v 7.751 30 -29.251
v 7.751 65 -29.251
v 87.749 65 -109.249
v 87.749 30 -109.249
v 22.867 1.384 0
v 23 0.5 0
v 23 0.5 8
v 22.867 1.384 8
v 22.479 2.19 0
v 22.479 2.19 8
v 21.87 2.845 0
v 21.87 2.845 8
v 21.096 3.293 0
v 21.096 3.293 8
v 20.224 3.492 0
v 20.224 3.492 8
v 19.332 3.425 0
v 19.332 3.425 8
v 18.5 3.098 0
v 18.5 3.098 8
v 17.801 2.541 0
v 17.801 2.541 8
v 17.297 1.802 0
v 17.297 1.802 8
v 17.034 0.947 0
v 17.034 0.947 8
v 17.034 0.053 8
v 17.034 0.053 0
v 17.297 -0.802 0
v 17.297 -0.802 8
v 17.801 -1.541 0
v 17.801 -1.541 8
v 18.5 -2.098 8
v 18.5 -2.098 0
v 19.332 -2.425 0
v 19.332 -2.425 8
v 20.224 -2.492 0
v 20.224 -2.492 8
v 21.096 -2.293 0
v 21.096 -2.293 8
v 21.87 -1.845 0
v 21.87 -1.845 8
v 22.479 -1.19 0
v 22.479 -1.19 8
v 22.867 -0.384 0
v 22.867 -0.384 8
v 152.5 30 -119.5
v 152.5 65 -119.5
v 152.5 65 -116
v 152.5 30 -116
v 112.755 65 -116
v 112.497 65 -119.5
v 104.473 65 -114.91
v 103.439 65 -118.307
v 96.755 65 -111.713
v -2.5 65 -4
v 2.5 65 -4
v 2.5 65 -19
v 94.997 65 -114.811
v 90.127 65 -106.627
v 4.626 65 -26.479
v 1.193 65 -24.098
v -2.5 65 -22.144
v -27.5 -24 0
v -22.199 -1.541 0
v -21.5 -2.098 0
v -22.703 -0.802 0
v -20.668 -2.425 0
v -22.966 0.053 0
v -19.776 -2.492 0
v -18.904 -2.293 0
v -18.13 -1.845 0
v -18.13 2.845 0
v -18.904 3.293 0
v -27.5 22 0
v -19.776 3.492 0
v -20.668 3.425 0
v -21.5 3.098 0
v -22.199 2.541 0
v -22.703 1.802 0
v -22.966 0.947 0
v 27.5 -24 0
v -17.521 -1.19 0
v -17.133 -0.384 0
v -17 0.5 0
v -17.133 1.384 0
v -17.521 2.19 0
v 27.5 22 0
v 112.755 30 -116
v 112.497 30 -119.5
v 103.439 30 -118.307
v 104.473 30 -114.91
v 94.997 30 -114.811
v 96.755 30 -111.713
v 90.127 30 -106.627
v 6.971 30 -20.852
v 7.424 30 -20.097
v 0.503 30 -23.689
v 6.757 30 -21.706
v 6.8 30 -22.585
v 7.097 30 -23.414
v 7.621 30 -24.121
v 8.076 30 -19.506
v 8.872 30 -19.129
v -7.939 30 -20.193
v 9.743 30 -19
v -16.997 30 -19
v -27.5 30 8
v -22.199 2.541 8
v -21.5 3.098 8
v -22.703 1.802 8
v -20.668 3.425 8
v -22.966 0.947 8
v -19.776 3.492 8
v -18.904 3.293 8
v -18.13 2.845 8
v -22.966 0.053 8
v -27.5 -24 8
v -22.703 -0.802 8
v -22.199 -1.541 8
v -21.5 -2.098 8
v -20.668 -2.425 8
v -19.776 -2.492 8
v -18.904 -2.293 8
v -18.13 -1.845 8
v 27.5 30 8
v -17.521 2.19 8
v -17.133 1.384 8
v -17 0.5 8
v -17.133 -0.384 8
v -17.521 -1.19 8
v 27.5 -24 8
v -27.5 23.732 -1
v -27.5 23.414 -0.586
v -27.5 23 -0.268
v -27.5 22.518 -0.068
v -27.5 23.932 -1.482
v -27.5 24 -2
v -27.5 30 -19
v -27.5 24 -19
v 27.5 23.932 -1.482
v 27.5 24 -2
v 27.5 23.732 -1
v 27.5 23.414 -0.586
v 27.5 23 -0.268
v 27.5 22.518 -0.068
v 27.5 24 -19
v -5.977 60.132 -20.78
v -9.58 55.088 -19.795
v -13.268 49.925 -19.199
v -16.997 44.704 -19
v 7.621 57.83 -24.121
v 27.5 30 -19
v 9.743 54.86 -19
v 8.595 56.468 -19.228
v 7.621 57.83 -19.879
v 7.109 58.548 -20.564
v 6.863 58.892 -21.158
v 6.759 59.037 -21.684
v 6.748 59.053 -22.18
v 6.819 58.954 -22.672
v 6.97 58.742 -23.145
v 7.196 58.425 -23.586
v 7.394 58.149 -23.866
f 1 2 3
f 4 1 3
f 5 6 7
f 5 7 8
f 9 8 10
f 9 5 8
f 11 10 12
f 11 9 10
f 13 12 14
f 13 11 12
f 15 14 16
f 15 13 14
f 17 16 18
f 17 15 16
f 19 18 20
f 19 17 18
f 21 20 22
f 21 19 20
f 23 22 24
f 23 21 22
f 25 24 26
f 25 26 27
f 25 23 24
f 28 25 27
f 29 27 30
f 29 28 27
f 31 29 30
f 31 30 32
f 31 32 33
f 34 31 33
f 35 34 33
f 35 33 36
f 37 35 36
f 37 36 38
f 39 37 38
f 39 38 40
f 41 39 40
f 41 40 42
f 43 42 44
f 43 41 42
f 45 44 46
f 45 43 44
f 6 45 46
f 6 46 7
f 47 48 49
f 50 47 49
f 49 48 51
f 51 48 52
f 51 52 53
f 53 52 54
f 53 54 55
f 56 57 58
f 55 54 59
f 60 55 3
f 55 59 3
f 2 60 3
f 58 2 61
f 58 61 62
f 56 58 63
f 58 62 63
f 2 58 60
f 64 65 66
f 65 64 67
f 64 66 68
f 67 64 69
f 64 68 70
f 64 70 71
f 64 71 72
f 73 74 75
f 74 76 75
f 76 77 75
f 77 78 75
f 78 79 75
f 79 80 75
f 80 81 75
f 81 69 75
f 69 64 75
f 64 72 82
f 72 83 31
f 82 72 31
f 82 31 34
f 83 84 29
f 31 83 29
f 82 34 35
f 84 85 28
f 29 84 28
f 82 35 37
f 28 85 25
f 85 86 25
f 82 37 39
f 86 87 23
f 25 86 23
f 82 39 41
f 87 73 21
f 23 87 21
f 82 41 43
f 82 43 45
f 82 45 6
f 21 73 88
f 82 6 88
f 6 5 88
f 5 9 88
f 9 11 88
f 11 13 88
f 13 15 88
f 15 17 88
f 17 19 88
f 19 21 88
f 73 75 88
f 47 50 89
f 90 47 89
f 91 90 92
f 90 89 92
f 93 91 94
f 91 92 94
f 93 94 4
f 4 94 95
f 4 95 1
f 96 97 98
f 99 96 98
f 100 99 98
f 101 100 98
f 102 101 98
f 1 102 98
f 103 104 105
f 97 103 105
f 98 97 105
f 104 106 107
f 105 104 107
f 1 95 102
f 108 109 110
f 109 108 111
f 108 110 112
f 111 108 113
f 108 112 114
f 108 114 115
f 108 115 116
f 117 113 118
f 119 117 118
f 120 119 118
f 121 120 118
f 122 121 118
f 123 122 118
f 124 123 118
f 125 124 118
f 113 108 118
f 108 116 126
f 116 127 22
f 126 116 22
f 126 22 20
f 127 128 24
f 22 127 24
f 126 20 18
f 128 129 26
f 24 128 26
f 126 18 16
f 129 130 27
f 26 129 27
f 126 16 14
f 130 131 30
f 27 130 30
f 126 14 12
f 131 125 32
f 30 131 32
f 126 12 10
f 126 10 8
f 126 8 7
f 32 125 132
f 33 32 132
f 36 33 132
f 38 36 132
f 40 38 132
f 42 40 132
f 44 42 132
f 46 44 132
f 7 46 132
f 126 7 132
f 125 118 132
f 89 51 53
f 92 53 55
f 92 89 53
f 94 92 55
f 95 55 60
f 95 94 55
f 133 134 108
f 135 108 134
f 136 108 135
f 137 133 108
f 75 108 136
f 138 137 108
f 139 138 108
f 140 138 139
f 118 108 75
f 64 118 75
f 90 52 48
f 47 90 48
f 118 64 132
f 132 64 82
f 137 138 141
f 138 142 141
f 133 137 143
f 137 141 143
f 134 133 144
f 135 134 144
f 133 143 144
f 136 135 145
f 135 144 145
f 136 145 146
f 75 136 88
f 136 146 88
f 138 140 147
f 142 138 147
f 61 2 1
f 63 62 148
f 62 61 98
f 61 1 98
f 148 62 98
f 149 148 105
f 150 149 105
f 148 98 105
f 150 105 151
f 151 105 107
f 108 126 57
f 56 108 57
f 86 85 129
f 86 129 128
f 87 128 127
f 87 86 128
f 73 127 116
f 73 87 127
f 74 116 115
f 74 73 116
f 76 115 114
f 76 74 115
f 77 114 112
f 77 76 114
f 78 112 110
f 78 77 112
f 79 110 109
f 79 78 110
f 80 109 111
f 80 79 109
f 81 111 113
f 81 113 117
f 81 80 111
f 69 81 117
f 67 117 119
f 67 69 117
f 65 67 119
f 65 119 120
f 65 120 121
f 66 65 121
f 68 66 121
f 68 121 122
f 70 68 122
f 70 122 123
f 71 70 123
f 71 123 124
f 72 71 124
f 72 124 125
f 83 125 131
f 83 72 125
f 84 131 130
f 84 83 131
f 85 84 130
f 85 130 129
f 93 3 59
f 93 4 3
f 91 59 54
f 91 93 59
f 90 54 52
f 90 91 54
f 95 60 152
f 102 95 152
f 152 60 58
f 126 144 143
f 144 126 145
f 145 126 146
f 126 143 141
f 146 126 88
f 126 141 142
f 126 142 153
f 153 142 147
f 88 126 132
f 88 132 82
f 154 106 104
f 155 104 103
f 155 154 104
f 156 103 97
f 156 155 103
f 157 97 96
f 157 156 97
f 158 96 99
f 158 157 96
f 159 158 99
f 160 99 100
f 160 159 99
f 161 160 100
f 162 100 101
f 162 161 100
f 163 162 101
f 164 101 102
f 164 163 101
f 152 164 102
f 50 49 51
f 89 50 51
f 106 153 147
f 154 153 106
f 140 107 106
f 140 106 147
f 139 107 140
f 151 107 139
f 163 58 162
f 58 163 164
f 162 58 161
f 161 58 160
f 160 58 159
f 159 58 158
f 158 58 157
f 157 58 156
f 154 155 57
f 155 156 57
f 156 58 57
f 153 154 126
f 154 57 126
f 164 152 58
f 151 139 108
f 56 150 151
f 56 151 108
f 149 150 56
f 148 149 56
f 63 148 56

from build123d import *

# Parameters (mm, degrees)
SKETCH1_W           = 55
SKETCH1_H           = 48
SKETCH1_R           = 3
BOSS_EXTRUDE1_DEPTH = 8
SKETCH2_W           = 55
SKETCH2_H           = 27
BOSS_EXTRUDE2_DEPTH = 6
SKETCH3_W           = 15
SKETCH3_H           = 35
BOSS_EXTRUDE3_DEPTH = 2.5
FILLET1_R           = 2
RIB1_REACH          = 75.091
SKETCH4_WALL_W      = 185.181394164
SKETCH4_WALL_H      = 5
BOSS_EXTRUDE5_REACH = 77.566
BOSS_EXTRUDE6_DEPTH = 35
FILLET3_R           = 35
FILLET4_R           = 32
FILLET5_R           = 35
FILLET6_R           = 3


with BuildPart() as part:
    # Sketch1 → Boss-Extrude1 (new body)
    with BuildSketch(Plane.XY):
        Rectangle(SKETCH1_W, SKETCH1_H)
        with Locations((20, 0.5)):
            Circle(SKETCH1_R, mode=Mode.SUBTRACT)
        with Locations((-20, 0.5)):
            Circle(SKETCH1_R, mode=Mode.SUBTRACT)
    extrude(amount=BOSS_EXTRUDE1_DEPTH)

    # Sketch2 → Boss-Extrude2 (add)
    with BuildSketch(Plane(origin=(0, 24, 0), x_dir=(1, 0, 0), z_dir=(0, 1, 0))):
        with Locations((0, 5.5)):
            Rectangle(SKETCH2_W, SKETCH2_H)
    extrude(amount=BOSS_EXTRUDE2_DEPTH)

    # Sketch3 → Boss-Extrude3 (add, symmetric)
    with BuildSketch(Plane(origin=(0, 0, 0), x_dir=(0, 0, -1), z_dir=(1, 0, 0))):
        with Locations((11.5, 47.5)):
            Rectangle(SKETCH3_W, SKETCH3_H)
    extrude(amount=BOSS_EXTRUDE3_DEPTH, both=True)

    # Fillet1
    fillet1_edges = [part.edges().sort_by_distance(p)[0] for p in [
        (0, 24, 0),
    ]]
    fillet(fillet1_edges, radius=FILLET1_R)

    # Sketch4 wall → Rib1 (add, up to next)
    with BuildSketch(Plane(origin=(0, 47.5, 2), x_dir=(0, -0.945945945946, 0.324324324324), z_dir=(0, -0.324324324324, -0.945945945946)), mode=Mode.PRIVATE) as rib1_sk1:
        Rectangle(SKETCH4_WALL_W, SKETCH4_WALL_H)
    rib1_tool1 = extrude(rib1_sk1.sketch, amount=RIB1_REACH, mode=Mode.PRIVATE) - part.part
    add(rib1_tool1.solids().sort_by_distance((0, 47.5, 2))[0])

    # Boss-Extrude5: up to this plane
    boss_extrude5_end = Plane(origin=(0, 65, -4), z_dir=(0, 0.3243243243243244, 0.945945945945946))
    # Sketch5 → Boss-Extrude5 (add, up to the surface)
    with BuildSketch(Plane(origin=(0, 0, -19), x_dir=(-1, 0, 0), z_dir=(0, 0, -1)), mode=Mode.PRIVATE) as boss_extrude5_sk1:
        Polygon((-27.5, 30), (-2.5, 65), (-2.5, 30), align=None)
    boss_extrude5_tool1 = split(extrude(boss_extrude5_sk1.sketch, amount=-BOSS_EXTRUDE5_REACH, mode=Mode.PRIVATE), bisect_by=boss_extrude5_end, keep=Keep.BOTH, mode=Mode.PRIVATE)
    boss_extrude5 = boss_extrude5_tool1.solids().sort_by_distance((10.833333, 41.666667, -19))[0]
    add(boss_extrude5)

    # Mirror1: Boss-Extrude5 across plane
    add(boss_extrude5.mirror(Plane(origin=(0, 0, 0), x_dir=(0, 0, 1), z_dir=(1, 0, 0))))

    # Sketch7 → Boss-Extrude6 (add)
    with BuildSketch(Plane(origin=(0, 65, 0), x_dir=(1, 0, 0), z_dir=(0, 1, 0))):
        Polygon((2.5, 19), (-2.5, 19), (98, 119.5), (152.5, 119.5), (152.5, 116), (99.5, 116), align=None)
    extrude(amount=-BOSS_EXTRUDE6_DEPTH)

    # Fillet3
    fillet3_edges = [part.edges().sort_by_distance(p)[0] for p in [
        (98, 47.5, -119.5),
    ]]
    fillet(fillet3_edges, radius=FILLET3_R)

    # Fillet4
    fillet4_edges = [part.edges().sort_by_distance(p)[0] for p in [
        (99.5, 47.5, -116),
    ]]
    fillet(fillet4_edges, radius=FILLET4_R)

    # Fillet5
    fillet5_edges = [part.edges().sort_by_distance(p)[0] for p in [
        (-2.5, 47.5, -19),
    ]]
    fillet(fillet5_edges, radius=FILLET5_R)

    # Fillet6
    # the kernel refuses this fillet: 3 mm, written as the material it adds along each edge
    with BuildSketch(Plane(origin=(2.5, 65, -19), x_dir=(1, 0, 0), z_dir=(0, -1, 0))) as fillet6_piece_1_section:
        with BuildLine():
            CenterArc((FILLET6_R * 2.41421356237, -FILLET6_R), FILLET6_R, 90, 135)
            Line((FILLET6_R * 1.70710678119, -FILLET6_R * 1.70710678119), (0, 0))
            Line((0, 0), (FILLET6_R * 2.41421356237, 0))
        make_face()
    fillet6_piece_1 = extrude(amount=35, mode=Mode.PRIVATE)
    fillet6_piece_1 = split(fillet6_piece_1, bisect_by=Plane(origin=(12.87170443, 50.479613798, -20.318339623), z_dir=(-0.813733471206735, -0.5812381937190964, 0)), keep=Keep.TOP, mode=Mode.PRIVATE)
    add(fillet6_piece_1)


solid = part.part
